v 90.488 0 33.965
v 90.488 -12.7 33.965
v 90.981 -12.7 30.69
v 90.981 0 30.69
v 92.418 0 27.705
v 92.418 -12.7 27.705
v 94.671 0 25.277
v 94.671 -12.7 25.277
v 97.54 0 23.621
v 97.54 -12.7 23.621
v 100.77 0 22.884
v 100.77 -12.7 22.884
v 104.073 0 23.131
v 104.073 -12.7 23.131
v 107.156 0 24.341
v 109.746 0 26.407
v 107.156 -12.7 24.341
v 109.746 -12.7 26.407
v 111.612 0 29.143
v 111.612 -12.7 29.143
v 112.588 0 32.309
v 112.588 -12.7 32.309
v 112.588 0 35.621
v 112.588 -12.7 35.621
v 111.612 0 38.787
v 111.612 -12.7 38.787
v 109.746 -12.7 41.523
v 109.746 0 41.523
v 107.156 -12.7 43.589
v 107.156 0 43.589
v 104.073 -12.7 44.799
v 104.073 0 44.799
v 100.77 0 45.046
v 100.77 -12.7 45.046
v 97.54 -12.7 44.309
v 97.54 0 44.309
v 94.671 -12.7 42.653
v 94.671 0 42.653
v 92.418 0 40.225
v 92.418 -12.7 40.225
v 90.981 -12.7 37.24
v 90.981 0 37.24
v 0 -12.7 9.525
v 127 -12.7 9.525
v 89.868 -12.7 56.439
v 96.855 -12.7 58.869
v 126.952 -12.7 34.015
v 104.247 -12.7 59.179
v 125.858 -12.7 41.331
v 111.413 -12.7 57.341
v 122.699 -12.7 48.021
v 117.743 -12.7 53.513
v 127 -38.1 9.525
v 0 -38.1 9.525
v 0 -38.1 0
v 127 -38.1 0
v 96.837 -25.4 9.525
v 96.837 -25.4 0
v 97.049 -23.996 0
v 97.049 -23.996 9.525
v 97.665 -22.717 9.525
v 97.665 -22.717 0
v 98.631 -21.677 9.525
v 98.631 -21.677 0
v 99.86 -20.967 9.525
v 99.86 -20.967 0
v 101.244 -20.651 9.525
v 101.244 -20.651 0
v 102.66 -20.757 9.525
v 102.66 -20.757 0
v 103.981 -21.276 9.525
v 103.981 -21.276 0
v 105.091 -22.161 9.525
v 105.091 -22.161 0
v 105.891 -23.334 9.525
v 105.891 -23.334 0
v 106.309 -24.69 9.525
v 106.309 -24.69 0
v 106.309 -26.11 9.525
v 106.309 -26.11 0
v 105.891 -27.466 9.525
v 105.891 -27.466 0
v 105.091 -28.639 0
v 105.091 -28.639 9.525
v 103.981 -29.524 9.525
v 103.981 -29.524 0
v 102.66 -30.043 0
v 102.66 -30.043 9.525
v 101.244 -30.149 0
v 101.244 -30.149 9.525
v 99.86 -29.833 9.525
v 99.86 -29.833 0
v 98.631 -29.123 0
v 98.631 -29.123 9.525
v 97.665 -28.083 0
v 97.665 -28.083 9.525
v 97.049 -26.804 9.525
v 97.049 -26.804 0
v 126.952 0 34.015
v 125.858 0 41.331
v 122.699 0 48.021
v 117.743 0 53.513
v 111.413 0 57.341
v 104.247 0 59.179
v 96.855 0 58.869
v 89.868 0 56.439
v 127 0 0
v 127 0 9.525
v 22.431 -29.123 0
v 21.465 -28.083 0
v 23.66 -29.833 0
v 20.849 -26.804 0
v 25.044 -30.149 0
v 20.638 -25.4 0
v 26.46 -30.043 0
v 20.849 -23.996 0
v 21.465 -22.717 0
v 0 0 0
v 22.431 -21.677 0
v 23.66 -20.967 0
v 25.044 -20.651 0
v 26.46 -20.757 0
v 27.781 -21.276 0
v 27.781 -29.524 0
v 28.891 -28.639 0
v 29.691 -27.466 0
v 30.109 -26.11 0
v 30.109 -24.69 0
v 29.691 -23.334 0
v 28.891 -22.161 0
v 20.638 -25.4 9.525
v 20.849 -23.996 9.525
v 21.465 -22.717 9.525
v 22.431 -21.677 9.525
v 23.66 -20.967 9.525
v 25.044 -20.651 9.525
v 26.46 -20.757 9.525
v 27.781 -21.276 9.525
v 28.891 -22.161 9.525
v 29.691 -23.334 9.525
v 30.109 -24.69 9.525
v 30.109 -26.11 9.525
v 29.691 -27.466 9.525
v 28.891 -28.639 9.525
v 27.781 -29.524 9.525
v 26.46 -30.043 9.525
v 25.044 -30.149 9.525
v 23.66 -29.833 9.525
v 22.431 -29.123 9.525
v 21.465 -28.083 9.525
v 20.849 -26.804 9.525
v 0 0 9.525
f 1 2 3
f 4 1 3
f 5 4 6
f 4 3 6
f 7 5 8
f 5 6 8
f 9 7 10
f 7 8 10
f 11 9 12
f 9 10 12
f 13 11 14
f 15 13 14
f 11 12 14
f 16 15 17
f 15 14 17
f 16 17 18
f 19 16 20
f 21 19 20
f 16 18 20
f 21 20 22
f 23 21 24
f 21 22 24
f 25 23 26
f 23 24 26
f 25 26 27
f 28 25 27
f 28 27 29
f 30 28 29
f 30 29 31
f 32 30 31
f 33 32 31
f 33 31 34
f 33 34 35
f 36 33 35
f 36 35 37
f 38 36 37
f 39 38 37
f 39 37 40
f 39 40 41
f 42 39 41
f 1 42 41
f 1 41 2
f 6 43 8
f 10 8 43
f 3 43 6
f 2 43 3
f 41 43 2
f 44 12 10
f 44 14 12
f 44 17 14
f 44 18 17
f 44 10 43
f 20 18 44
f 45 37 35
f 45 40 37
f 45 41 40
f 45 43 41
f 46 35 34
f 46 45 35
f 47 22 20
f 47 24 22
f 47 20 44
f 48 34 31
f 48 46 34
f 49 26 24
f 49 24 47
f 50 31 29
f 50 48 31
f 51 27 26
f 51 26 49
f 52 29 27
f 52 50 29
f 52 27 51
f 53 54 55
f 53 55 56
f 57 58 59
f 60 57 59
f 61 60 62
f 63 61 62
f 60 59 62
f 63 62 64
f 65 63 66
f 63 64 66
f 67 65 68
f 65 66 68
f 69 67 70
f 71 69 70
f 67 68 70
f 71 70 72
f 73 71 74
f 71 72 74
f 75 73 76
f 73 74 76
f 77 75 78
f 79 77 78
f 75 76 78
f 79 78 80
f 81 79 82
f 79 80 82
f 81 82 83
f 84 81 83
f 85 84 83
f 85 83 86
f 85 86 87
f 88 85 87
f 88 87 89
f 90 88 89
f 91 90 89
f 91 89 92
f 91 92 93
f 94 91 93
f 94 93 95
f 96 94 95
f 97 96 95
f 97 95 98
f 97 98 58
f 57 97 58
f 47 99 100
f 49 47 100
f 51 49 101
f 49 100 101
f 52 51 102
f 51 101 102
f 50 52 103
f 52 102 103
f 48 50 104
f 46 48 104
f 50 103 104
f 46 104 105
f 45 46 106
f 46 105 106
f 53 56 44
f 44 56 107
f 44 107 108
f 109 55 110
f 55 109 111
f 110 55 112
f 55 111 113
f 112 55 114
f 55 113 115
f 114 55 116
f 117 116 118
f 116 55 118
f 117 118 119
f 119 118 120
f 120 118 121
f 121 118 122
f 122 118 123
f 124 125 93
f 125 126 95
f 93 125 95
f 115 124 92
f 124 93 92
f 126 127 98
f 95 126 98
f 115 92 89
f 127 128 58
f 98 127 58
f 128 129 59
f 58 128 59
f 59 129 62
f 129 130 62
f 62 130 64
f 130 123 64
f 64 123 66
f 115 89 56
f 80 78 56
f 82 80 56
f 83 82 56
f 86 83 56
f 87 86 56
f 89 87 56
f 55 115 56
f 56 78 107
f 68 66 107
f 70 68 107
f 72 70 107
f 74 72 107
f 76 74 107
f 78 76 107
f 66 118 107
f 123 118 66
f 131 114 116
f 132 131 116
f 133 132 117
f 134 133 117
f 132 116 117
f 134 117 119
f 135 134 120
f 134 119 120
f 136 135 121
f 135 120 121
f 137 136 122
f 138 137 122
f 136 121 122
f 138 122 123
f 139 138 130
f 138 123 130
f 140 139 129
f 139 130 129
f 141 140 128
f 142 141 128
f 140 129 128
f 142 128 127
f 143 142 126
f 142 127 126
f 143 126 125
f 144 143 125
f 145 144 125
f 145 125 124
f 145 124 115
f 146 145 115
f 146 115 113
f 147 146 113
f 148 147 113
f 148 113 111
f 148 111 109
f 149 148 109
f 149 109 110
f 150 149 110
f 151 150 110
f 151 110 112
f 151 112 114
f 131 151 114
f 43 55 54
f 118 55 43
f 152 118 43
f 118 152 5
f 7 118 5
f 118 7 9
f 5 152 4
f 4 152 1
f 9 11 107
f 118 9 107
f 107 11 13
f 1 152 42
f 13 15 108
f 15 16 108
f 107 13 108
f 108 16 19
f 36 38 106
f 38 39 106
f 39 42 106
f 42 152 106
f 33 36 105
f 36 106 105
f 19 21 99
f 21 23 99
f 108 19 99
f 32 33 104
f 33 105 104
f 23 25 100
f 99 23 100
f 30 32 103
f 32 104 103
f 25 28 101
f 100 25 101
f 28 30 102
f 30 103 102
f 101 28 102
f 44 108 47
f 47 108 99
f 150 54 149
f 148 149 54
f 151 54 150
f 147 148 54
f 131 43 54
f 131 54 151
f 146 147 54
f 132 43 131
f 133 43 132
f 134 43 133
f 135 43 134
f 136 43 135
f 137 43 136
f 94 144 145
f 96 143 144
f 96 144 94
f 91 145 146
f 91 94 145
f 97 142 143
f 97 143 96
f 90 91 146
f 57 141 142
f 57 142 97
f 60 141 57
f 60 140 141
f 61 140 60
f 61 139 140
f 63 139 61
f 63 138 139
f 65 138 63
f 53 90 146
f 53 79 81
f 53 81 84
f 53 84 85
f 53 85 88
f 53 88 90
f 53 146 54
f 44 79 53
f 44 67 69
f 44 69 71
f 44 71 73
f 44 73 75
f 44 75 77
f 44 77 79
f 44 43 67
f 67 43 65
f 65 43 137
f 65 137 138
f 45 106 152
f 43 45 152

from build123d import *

# Parameters (mm, degrees)
F0_W     = 127
F0_H     = 9.525
F1_DEPTH = 38.1
F2_DEPTH = 12.7
F3_D     = 22.225
F5_D     = 9.525


with BuildPart() as f1:
    # F0 (on Front) → F1 (new body)
    with BuildSketch(Plane.XZ):
        with Locations((63.5, 4.7625)):
            Rectangle(F0_W, F0_H)
    extrude(amount=F1_DEPTH)

    # F0 (on Front) → F2 (join)
    with BuildSketch(Plane.XZ):
        with BuildLine():
            Line((89.8677585571, 56.4390714728), (0, 9.525))
            Line((0, 9.525), (127, 9.525))
            Line((127, 9.525), (126.9520602505, 34.0146270286))
            ThreePointArc((126.9520602505, 34.0146270286), (114.7182618225, 55.6592523753), (89.8677585571, 56.4390714728))
        make_face()
    extrude(amount=F2_DEPTH)

    # F3 (through all)
    with Locations(Plane(origin=(0, 0, 0), x_dir=(1, 0, 0), z_dir=(0, 1, 0))):
        with Locations((101.6, -33.9649990201)):
            Hole(F3_D / 2)

    # F5 (through all)
    with Locations(Plane.XY.offset(9.525)):
        with Locations((25.4, -25.4), (101.6, -25.4)):
            Hole(F5_D / 2)


solid = f1.part
